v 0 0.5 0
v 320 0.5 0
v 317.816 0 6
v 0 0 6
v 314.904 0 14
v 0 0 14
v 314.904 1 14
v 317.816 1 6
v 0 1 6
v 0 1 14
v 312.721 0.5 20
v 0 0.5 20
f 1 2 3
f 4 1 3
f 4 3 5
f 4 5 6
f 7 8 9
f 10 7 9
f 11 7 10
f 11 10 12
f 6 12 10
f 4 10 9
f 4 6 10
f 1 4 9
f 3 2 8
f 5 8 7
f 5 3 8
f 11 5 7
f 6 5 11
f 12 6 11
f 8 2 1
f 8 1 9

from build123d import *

# Parameters (mm, degrees)
BOSS_EXTRUDE1_DEPTH = 1
CHAMFER1_SIZE       = 0.5
CHAMFER1_SIZE_2     = 6
CHAMFER2_SIZE       = 6
CHAMFER2_SIZE_2     = 0.5


with BuildPart() as part:
    # Sketch1 → Boss-Extrude1 (new body)
    with BuildSketch(Plane(origin=(0, 0, 0), x_dir=(1, 0, 0), z_dir=(0, 1, 0))):
        Polygon((0, -20), (0, 0), (320, 0), (312.720595315, -20), align=None)
    extrude(amount=BOSS_EXTRUDE1_DEPTH)

    # Chamfer1
    # the kernel refuses this chamfer: 6, 0.5 mm, written as the material it takes off along each edge
    with BuildSketch(Plane(origin=(-15.598007041, 0, 0), x_dir=(0, 0.908488621033374, -0.4179095900465534), z_dir=(1, 0, 0))) as chamfer1_piece_1:
        Polygon((CHAMFER1_SIZE * 0.908488621033, CHAMFER1_SIZE * 0.417909590047), (-CHAMFER1_SIZE_2 * 0.417909590047, CHAMFER1_SIZE_2 * 0.908488621033), (0, 0), align=None)
    extrude(amount=351.196014082, mode=Mode.SUBTRACT)
    with BuildSketch(Plane(origin=(-15.598007041, 1, 0), x_dir=(0, -0.908488621033374, -0.4179095900465534), z_dir=(1, 0, 0))) as chamfer1_piece_2:
        Polygon((CHAMFER1_SIZE * 0.908488621033, -CHAMFER1_SIZE * 0.417909590047), (-CHAMFER1_SIZE_2 * 0.417909590047, -CHAMFER1_SIZE_2 * 0.908488621033), (0, 0), align=None)
    extrude(amount=351.196014082, mode=Mode.SUBTRACT)

    # Chamfer2
    # the kernel refuses this chamfer: 6, 0.5 mm, written as the material it takes off along each edge
    with BuildSketch(Plane(origin=(328.318602356, 0, 20), x_dir=(0, -0.0031944650224573633, -0.9999948976835933), z_dir=(-1, 0, 0))) as chamfer2_piece_1:
        Polygon((CHAMFER2_SIZE * 0.999994897684, -CHAMFER2_SIZE * 0.00319446502246), (-CHAMFER2_SIZE_2 * 0.00319446502246, -CHAMFER2_SIZE_2 * 0.999994897684), (0, 0), align=None)
    extrude(amount=343.916609397, mode=Mode.SUBTRACT)
    with BuildSketch(Plane(origin=(328.318602356, 1, 20), x_dir=(0, 0.0031944650224573715, -0.9999948976835933), z_dir=(-1, 0, 0))) as chamfer2_piece_2:
        Polygon((CHAMFER2_SIZE * 0.999994897684, CHAMFER2_SIZE * 0.00319446502246), (-CHAMFER2_SIZE_2 * 0.00319446502246, CHAMFER2_SIZE_2 * 0.999994897684), (0, 0), align=None)
    extrude(amount=343.916609397, mode=Mode.SUBTRACT)


solid = part.part
